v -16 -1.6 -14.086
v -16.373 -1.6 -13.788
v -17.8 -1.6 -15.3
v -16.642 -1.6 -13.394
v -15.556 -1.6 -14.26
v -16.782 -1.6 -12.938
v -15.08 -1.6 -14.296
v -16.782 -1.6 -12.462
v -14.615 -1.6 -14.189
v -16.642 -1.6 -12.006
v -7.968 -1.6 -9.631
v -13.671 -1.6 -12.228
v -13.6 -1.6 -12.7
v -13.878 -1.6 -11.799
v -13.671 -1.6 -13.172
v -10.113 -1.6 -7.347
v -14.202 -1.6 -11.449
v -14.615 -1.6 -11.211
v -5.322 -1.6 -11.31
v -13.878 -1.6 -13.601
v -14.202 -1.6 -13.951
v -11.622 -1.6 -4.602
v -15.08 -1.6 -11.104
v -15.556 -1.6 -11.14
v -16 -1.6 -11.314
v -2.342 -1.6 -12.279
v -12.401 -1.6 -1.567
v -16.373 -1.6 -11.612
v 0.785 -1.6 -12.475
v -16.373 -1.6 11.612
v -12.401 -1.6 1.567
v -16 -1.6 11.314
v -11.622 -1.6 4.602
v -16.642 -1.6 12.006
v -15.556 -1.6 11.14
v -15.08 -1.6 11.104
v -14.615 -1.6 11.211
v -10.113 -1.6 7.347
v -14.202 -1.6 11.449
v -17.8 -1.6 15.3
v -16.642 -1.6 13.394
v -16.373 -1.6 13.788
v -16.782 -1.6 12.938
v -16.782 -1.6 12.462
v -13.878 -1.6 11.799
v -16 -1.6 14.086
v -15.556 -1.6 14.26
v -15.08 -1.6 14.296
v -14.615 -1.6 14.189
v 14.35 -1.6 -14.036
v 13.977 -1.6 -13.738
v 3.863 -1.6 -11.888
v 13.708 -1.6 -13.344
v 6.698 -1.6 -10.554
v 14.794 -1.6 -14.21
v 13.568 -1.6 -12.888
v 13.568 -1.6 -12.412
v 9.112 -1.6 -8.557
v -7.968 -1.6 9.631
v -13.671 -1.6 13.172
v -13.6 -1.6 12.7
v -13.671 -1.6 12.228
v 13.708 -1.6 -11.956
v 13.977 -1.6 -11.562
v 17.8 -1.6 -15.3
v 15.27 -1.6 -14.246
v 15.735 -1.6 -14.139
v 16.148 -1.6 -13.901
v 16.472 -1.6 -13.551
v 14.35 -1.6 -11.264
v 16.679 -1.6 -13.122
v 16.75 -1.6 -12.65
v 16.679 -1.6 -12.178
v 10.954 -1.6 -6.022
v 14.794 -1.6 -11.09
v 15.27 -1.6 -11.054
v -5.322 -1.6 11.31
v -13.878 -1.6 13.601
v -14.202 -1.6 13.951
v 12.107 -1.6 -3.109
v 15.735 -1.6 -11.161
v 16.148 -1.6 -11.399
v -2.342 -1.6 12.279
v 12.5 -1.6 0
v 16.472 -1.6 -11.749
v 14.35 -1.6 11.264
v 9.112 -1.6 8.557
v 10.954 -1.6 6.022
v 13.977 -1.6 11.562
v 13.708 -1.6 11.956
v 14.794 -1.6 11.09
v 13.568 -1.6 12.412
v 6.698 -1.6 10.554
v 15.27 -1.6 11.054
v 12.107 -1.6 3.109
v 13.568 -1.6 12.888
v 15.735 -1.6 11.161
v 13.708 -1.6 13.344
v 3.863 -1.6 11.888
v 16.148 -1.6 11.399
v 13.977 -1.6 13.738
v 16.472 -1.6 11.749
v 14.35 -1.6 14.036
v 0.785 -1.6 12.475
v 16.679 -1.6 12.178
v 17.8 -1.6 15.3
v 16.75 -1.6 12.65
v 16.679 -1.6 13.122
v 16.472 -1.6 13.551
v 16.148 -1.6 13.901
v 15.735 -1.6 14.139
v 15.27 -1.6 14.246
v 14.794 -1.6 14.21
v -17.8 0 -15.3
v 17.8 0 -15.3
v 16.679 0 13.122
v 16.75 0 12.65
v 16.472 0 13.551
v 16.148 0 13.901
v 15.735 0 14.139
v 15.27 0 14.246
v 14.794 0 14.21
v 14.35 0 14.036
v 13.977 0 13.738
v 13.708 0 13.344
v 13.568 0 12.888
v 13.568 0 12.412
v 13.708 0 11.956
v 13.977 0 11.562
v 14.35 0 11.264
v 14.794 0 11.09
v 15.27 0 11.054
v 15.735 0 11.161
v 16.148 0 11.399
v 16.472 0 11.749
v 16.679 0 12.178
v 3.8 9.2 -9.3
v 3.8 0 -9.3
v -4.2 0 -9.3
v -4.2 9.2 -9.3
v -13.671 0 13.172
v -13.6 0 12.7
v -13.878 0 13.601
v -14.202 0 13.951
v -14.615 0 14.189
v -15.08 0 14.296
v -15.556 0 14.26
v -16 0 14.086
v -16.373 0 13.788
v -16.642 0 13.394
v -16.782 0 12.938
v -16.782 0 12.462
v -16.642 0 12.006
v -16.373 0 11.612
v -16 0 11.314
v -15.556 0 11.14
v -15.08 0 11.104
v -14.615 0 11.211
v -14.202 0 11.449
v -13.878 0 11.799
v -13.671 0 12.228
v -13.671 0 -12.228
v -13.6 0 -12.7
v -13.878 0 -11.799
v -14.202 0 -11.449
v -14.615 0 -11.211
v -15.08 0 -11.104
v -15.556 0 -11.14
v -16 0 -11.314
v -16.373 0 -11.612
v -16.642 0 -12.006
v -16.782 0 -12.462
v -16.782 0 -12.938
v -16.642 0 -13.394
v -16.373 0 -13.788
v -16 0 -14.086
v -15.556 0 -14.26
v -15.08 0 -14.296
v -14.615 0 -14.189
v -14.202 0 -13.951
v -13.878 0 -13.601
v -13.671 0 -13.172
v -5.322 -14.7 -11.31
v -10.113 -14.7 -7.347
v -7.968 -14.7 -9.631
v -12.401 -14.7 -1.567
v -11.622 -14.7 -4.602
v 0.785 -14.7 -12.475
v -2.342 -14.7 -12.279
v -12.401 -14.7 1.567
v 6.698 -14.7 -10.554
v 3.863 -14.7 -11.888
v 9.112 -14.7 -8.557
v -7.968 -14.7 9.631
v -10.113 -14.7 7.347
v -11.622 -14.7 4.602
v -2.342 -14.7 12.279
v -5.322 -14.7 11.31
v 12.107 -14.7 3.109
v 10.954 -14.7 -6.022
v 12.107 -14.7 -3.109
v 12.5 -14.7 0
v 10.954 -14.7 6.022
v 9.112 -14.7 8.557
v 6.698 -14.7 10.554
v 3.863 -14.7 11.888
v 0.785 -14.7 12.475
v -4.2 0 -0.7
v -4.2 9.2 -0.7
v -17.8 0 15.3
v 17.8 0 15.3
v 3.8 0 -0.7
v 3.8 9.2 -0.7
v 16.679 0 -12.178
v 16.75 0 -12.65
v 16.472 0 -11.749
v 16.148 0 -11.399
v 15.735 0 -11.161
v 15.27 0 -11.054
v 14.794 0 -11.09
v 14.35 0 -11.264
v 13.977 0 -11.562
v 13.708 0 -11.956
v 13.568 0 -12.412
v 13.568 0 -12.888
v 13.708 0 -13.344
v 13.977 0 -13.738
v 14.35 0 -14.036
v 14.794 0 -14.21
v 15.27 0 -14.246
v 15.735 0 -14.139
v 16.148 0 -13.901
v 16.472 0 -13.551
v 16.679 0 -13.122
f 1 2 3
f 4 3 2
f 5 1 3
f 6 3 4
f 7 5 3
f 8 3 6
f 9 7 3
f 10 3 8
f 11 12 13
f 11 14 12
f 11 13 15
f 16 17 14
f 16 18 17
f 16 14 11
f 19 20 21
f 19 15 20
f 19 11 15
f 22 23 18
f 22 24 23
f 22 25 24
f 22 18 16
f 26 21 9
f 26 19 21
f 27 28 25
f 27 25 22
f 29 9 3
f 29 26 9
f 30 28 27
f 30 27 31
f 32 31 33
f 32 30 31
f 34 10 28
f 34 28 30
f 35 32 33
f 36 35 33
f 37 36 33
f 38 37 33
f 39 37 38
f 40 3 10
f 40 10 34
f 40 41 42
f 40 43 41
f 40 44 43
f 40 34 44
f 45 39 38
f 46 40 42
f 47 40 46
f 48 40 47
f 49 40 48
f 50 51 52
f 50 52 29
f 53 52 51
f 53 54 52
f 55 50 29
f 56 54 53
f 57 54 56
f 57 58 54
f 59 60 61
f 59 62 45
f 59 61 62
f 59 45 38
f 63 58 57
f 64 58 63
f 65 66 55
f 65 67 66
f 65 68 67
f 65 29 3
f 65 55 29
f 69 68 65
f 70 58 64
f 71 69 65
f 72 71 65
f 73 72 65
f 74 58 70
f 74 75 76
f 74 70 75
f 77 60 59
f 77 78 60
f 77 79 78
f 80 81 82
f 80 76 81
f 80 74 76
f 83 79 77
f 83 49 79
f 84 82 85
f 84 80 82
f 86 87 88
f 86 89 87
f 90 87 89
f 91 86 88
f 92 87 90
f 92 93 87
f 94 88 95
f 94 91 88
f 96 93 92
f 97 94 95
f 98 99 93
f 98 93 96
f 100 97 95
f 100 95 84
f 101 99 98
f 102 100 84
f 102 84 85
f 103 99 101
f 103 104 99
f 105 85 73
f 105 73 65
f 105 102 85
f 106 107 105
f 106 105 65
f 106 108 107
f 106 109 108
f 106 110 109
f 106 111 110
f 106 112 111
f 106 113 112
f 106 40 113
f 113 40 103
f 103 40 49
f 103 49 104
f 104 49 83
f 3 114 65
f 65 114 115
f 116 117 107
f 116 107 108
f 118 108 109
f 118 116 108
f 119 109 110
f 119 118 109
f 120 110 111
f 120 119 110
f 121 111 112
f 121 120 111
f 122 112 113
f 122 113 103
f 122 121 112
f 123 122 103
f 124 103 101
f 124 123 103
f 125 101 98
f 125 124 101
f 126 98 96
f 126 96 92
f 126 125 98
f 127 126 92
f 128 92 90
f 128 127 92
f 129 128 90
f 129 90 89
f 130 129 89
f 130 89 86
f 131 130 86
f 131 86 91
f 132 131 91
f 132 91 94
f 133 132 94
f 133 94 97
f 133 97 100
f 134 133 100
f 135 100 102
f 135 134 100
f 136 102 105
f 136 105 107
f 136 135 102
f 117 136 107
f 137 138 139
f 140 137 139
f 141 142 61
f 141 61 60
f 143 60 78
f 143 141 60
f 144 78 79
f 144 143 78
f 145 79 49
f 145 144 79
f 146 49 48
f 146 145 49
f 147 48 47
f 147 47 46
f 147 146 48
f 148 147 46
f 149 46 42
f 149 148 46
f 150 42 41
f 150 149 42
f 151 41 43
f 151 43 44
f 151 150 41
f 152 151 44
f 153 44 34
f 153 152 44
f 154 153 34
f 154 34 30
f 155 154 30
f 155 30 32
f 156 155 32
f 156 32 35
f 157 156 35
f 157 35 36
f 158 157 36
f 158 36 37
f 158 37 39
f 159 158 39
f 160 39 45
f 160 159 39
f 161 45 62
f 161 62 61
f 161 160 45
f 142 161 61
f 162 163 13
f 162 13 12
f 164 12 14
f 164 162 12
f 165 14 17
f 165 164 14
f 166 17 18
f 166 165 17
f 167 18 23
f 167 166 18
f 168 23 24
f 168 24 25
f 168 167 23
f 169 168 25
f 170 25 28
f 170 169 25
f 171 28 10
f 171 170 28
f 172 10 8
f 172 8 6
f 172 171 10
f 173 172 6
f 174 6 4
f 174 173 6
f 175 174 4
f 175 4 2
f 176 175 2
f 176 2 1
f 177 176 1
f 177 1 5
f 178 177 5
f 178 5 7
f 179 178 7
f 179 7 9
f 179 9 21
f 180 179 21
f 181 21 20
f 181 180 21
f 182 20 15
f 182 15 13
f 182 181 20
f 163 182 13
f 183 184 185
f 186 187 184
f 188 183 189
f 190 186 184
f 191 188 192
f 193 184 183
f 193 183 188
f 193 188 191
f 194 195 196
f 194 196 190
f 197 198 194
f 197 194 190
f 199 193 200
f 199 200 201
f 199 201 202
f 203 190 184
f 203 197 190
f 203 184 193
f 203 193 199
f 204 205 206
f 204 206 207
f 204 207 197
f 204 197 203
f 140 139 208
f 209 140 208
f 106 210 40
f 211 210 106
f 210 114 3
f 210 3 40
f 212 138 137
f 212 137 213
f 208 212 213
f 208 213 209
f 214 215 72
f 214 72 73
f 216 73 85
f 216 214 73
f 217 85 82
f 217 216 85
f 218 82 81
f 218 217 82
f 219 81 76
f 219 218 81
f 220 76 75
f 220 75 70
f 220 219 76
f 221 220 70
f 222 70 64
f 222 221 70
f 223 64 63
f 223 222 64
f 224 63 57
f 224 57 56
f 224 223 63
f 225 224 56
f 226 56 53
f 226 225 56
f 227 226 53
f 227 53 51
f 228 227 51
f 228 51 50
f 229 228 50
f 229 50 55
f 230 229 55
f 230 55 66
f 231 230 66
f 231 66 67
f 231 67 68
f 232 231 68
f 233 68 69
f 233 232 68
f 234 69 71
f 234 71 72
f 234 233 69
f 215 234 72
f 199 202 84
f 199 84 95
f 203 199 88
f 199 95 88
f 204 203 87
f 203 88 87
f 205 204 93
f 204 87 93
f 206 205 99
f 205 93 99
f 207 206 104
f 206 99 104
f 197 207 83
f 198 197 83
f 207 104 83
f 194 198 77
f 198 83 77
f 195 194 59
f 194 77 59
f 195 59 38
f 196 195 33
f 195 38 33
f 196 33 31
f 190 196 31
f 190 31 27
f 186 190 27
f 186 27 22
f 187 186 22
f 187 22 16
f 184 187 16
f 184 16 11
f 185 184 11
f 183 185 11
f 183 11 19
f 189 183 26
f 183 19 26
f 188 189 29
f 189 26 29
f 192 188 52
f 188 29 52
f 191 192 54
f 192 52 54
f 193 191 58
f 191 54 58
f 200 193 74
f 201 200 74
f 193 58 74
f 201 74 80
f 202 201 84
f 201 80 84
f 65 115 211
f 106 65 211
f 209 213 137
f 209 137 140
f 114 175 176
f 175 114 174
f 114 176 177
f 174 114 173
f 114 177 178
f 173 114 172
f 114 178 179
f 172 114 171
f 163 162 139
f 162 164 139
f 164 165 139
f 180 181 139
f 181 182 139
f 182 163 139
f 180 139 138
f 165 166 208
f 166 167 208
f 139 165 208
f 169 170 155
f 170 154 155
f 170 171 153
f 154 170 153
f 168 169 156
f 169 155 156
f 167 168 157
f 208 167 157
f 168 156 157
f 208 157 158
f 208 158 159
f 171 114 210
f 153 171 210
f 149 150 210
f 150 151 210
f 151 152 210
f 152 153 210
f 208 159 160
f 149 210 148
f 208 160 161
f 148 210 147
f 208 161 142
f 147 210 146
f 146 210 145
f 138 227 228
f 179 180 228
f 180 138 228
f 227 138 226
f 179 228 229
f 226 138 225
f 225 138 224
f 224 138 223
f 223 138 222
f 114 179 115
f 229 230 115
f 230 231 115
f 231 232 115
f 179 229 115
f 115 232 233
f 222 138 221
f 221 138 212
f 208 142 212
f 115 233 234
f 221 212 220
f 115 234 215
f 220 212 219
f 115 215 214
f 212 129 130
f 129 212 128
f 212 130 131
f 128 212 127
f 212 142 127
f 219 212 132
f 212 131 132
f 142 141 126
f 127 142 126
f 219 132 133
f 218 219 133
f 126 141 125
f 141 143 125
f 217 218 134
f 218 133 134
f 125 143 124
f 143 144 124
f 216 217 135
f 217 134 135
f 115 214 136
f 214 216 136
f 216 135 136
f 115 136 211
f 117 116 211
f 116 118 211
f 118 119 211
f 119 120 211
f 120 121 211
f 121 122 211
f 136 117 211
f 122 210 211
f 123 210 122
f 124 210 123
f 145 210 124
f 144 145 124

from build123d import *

# Parameters (mm, degrees)
F0_W     = 35.6
F0_H     = 30.6
F0_R     = 1.6
F1_DEPTH = 1.6
F2_R     = 12.5
F3_DEPTH = 13.1
F4_W     = 8
F4_H     = 8.6
F5_DEPTH = 9.2


with BuildPart() as f1:
    # F0 (on Front) → F1 (new body)
    with BuildSketch(Plane.XZ):
        Rectangle(F0_W, F0_H)
        with Locations((-15.2, -12.7)):
            Circle(F0_R, mode=Mode.SUBTRACT)
        with Locations((15.15, -12.65)):
            Circle(F0_R, mode=Mode.SUBTRACT)
        with Locations((-15.2, 12.7)):
            Circle(F0_R, mode=Mode.SUBTRACT)
        with Locations((15.15, 12.65)):
            Circle(F0_R, mode=Mode.SUBTRACT)
    extrude(amount=F1_DEPTH)

    # F2 (on face) → F3 (join)
    with BuildSketch(Plane.XZ.offset(1.6)):
        Circle(F2_R)
    extrude(amount=F3_DEPTH)

    # F4 (on face) → F5 (join)
    with BuildSketch(Plane(origin=(0, 0, 0), x_dir=(-1, 0, 0), z_dir=(0, 1, 0))):
        with Locations((0.2, -5)):
            Rectangle(F4_W, F4_H)
    extrude(amount=F5_DEPTH)


solid = f1.part
